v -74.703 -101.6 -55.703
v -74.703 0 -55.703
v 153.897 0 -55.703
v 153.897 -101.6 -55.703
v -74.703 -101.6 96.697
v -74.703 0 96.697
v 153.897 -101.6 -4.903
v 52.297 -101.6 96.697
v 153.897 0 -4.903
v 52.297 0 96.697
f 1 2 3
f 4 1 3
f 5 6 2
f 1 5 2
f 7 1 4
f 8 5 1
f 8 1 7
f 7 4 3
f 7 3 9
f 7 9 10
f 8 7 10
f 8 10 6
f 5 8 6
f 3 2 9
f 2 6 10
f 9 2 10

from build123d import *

# Parameters (mm, degrees)
F0_W     = 101.6
F0_H     = 50.8
F1_DEPTH = 101.6


with BuildPart() as f1:
    # F0 (on Front) → F1 (new body)
    with BuildSketch(Plane.XZ):
        Polygon((52.296527, 96.696837), (-74.703473, 96.696837), (-74.703473, -55.703163), (52.296527, -55.703163), (52.296527, -4.903163), align=None)
        Polygon((153.896527, -4.903163), (52.296527, 96.696837), (52.296527, -4.903163), align=None)
        with Locations((103.096527, -30.303163)):
            Rectangle(F0_W, F0_H)
    extrude(amount=F1_DEPTH)


solid = f1.part
